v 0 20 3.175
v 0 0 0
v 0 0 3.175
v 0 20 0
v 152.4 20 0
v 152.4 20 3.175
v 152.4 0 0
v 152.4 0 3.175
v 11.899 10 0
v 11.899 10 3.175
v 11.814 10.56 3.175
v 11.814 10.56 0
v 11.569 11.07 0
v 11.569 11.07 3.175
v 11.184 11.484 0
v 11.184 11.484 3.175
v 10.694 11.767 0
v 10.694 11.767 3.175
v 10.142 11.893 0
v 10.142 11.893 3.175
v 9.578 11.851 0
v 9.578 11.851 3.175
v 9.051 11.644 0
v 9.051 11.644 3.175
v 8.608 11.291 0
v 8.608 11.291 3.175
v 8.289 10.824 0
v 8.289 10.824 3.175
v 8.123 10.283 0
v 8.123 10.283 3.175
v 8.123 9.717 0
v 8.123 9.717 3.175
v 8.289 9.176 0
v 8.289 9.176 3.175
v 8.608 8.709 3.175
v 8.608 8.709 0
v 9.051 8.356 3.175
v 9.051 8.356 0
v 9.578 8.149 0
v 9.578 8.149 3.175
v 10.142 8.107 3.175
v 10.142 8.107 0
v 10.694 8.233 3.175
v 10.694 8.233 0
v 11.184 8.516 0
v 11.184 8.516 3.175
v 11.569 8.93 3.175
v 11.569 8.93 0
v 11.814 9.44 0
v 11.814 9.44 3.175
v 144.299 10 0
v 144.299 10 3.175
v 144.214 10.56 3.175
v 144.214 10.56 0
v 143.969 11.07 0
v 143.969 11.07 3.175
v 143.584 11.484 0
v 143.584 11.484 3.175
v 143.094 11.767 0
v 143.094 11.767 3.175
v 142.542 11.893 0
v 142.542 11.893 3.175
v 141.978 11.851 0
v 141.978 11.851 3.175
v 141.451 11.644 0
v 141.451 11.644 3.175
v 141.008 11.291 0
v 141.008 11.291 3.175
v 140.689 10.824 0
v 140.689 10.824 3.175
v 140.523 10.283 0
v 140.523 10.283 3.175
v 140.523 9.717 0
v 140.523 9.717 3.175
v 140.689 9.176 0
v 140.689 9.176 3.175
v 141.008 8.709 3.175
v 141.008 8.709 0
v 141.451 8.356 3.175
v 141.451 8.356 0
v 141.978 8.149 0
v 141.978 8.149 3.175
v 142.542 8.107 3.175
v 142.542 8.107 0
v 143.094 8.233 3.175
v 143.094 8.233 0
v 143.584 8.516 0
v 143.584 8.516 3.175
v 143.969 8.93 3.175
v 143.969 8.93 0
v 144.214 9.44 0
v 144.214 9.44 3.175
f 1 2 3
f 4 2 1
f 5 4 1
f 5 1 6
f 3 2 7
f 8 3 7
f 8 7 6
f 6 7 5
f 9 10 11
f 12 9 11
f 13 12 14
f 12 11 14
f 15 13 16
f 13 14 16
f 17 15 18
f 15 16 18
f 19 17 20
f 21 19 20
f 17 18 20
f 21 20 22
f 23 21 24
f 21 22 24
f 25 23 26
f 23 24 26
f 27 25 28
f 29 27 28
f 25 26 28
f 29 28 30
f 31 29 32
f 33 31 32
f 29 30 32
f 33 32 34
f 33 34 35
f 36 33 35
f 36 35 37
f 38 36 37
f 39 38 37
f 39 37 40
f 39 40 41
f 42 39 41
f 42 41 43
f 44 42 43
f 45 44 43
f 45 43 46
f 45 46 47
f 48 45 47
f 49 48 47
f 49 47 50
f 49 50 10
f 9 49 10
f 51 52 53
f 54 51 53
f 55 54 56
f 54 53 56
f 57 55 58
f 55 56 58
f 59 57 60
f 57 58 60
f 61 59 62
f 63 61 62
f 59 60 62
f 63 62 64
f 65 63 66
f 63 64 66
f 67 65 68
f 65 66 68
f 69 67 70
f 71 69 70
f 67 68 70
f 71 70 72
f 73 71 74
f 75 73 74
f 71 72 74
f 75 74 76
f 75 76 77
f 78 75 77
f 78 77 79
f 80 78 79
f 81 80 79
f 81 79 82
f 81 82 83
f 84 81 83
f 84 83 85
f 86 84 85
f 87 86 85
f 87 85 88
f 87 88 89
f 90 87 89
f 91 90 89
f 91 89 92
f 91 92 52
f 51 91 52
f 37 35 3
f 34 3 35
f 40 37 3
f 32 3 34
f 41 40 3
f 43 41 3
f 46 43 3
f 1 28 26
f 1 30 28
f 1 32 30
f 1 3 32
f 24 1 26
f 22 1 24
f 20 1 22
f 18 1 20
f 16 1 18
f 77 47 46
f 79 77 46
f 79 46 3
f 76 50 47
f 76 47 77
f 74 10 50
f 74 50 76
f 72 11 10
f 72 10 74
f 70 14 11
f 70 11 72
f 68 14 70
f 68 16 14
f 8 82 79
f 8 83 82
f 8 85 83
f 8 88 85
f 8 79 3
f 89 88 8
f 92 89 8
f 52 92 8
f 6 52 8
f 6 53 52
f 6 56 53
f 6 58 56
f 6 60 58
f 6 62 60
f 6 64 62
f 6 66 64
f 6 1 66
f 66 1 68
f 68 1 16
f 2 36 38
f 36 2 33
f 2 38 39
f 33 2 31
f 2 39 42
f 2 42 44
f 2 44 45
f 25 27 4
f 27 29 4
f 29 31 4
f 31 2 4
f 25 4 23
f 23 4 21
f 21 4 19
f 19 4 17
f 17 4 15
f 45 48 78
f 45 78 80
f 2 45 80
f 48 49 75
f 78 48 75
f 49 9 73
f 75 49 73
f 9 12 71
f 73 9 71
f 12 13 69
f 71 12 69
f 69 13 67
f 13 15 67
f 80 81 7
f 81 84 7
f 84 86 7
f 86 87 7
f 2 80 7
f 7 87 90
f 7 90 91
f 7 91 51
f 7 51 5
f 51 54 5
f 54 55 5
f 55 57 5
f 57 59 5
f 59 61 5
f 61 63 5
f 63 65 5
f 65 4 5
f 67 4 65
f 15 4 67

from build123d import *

# Parameters (mm, degrees)
SKETCH1_W             = 152.4
SKETCH1_H             = 20
BOSS_EXTRUDE1_DEPTH   = 3.175
F_6_CLEARANCE_HOLE1_D = 3.7973


with BuildPart() as part:
    # Sketch1 → Boss-Extrude1 (new body)
    with BuildSketch(Plane.XY):
        with Locations((76.2, 10)):
            Rectangle(SKETCH1_W, SKETCH1_H)
    extrude(amount=BOSS_EXTRUDE1_DEPTH)

    # #6 Clearance Hole1 (through all)
    with Locations(Plane(origin=(0, 0, 0), x_dir=(-1, 0, 0), z_dir=(0, 0, -1))):
        with Locations((-142.4, 10), (-10, 10)):
            Hole(F_6_CLEARANCE_HOLE1_D / 2)


solid = part.part
